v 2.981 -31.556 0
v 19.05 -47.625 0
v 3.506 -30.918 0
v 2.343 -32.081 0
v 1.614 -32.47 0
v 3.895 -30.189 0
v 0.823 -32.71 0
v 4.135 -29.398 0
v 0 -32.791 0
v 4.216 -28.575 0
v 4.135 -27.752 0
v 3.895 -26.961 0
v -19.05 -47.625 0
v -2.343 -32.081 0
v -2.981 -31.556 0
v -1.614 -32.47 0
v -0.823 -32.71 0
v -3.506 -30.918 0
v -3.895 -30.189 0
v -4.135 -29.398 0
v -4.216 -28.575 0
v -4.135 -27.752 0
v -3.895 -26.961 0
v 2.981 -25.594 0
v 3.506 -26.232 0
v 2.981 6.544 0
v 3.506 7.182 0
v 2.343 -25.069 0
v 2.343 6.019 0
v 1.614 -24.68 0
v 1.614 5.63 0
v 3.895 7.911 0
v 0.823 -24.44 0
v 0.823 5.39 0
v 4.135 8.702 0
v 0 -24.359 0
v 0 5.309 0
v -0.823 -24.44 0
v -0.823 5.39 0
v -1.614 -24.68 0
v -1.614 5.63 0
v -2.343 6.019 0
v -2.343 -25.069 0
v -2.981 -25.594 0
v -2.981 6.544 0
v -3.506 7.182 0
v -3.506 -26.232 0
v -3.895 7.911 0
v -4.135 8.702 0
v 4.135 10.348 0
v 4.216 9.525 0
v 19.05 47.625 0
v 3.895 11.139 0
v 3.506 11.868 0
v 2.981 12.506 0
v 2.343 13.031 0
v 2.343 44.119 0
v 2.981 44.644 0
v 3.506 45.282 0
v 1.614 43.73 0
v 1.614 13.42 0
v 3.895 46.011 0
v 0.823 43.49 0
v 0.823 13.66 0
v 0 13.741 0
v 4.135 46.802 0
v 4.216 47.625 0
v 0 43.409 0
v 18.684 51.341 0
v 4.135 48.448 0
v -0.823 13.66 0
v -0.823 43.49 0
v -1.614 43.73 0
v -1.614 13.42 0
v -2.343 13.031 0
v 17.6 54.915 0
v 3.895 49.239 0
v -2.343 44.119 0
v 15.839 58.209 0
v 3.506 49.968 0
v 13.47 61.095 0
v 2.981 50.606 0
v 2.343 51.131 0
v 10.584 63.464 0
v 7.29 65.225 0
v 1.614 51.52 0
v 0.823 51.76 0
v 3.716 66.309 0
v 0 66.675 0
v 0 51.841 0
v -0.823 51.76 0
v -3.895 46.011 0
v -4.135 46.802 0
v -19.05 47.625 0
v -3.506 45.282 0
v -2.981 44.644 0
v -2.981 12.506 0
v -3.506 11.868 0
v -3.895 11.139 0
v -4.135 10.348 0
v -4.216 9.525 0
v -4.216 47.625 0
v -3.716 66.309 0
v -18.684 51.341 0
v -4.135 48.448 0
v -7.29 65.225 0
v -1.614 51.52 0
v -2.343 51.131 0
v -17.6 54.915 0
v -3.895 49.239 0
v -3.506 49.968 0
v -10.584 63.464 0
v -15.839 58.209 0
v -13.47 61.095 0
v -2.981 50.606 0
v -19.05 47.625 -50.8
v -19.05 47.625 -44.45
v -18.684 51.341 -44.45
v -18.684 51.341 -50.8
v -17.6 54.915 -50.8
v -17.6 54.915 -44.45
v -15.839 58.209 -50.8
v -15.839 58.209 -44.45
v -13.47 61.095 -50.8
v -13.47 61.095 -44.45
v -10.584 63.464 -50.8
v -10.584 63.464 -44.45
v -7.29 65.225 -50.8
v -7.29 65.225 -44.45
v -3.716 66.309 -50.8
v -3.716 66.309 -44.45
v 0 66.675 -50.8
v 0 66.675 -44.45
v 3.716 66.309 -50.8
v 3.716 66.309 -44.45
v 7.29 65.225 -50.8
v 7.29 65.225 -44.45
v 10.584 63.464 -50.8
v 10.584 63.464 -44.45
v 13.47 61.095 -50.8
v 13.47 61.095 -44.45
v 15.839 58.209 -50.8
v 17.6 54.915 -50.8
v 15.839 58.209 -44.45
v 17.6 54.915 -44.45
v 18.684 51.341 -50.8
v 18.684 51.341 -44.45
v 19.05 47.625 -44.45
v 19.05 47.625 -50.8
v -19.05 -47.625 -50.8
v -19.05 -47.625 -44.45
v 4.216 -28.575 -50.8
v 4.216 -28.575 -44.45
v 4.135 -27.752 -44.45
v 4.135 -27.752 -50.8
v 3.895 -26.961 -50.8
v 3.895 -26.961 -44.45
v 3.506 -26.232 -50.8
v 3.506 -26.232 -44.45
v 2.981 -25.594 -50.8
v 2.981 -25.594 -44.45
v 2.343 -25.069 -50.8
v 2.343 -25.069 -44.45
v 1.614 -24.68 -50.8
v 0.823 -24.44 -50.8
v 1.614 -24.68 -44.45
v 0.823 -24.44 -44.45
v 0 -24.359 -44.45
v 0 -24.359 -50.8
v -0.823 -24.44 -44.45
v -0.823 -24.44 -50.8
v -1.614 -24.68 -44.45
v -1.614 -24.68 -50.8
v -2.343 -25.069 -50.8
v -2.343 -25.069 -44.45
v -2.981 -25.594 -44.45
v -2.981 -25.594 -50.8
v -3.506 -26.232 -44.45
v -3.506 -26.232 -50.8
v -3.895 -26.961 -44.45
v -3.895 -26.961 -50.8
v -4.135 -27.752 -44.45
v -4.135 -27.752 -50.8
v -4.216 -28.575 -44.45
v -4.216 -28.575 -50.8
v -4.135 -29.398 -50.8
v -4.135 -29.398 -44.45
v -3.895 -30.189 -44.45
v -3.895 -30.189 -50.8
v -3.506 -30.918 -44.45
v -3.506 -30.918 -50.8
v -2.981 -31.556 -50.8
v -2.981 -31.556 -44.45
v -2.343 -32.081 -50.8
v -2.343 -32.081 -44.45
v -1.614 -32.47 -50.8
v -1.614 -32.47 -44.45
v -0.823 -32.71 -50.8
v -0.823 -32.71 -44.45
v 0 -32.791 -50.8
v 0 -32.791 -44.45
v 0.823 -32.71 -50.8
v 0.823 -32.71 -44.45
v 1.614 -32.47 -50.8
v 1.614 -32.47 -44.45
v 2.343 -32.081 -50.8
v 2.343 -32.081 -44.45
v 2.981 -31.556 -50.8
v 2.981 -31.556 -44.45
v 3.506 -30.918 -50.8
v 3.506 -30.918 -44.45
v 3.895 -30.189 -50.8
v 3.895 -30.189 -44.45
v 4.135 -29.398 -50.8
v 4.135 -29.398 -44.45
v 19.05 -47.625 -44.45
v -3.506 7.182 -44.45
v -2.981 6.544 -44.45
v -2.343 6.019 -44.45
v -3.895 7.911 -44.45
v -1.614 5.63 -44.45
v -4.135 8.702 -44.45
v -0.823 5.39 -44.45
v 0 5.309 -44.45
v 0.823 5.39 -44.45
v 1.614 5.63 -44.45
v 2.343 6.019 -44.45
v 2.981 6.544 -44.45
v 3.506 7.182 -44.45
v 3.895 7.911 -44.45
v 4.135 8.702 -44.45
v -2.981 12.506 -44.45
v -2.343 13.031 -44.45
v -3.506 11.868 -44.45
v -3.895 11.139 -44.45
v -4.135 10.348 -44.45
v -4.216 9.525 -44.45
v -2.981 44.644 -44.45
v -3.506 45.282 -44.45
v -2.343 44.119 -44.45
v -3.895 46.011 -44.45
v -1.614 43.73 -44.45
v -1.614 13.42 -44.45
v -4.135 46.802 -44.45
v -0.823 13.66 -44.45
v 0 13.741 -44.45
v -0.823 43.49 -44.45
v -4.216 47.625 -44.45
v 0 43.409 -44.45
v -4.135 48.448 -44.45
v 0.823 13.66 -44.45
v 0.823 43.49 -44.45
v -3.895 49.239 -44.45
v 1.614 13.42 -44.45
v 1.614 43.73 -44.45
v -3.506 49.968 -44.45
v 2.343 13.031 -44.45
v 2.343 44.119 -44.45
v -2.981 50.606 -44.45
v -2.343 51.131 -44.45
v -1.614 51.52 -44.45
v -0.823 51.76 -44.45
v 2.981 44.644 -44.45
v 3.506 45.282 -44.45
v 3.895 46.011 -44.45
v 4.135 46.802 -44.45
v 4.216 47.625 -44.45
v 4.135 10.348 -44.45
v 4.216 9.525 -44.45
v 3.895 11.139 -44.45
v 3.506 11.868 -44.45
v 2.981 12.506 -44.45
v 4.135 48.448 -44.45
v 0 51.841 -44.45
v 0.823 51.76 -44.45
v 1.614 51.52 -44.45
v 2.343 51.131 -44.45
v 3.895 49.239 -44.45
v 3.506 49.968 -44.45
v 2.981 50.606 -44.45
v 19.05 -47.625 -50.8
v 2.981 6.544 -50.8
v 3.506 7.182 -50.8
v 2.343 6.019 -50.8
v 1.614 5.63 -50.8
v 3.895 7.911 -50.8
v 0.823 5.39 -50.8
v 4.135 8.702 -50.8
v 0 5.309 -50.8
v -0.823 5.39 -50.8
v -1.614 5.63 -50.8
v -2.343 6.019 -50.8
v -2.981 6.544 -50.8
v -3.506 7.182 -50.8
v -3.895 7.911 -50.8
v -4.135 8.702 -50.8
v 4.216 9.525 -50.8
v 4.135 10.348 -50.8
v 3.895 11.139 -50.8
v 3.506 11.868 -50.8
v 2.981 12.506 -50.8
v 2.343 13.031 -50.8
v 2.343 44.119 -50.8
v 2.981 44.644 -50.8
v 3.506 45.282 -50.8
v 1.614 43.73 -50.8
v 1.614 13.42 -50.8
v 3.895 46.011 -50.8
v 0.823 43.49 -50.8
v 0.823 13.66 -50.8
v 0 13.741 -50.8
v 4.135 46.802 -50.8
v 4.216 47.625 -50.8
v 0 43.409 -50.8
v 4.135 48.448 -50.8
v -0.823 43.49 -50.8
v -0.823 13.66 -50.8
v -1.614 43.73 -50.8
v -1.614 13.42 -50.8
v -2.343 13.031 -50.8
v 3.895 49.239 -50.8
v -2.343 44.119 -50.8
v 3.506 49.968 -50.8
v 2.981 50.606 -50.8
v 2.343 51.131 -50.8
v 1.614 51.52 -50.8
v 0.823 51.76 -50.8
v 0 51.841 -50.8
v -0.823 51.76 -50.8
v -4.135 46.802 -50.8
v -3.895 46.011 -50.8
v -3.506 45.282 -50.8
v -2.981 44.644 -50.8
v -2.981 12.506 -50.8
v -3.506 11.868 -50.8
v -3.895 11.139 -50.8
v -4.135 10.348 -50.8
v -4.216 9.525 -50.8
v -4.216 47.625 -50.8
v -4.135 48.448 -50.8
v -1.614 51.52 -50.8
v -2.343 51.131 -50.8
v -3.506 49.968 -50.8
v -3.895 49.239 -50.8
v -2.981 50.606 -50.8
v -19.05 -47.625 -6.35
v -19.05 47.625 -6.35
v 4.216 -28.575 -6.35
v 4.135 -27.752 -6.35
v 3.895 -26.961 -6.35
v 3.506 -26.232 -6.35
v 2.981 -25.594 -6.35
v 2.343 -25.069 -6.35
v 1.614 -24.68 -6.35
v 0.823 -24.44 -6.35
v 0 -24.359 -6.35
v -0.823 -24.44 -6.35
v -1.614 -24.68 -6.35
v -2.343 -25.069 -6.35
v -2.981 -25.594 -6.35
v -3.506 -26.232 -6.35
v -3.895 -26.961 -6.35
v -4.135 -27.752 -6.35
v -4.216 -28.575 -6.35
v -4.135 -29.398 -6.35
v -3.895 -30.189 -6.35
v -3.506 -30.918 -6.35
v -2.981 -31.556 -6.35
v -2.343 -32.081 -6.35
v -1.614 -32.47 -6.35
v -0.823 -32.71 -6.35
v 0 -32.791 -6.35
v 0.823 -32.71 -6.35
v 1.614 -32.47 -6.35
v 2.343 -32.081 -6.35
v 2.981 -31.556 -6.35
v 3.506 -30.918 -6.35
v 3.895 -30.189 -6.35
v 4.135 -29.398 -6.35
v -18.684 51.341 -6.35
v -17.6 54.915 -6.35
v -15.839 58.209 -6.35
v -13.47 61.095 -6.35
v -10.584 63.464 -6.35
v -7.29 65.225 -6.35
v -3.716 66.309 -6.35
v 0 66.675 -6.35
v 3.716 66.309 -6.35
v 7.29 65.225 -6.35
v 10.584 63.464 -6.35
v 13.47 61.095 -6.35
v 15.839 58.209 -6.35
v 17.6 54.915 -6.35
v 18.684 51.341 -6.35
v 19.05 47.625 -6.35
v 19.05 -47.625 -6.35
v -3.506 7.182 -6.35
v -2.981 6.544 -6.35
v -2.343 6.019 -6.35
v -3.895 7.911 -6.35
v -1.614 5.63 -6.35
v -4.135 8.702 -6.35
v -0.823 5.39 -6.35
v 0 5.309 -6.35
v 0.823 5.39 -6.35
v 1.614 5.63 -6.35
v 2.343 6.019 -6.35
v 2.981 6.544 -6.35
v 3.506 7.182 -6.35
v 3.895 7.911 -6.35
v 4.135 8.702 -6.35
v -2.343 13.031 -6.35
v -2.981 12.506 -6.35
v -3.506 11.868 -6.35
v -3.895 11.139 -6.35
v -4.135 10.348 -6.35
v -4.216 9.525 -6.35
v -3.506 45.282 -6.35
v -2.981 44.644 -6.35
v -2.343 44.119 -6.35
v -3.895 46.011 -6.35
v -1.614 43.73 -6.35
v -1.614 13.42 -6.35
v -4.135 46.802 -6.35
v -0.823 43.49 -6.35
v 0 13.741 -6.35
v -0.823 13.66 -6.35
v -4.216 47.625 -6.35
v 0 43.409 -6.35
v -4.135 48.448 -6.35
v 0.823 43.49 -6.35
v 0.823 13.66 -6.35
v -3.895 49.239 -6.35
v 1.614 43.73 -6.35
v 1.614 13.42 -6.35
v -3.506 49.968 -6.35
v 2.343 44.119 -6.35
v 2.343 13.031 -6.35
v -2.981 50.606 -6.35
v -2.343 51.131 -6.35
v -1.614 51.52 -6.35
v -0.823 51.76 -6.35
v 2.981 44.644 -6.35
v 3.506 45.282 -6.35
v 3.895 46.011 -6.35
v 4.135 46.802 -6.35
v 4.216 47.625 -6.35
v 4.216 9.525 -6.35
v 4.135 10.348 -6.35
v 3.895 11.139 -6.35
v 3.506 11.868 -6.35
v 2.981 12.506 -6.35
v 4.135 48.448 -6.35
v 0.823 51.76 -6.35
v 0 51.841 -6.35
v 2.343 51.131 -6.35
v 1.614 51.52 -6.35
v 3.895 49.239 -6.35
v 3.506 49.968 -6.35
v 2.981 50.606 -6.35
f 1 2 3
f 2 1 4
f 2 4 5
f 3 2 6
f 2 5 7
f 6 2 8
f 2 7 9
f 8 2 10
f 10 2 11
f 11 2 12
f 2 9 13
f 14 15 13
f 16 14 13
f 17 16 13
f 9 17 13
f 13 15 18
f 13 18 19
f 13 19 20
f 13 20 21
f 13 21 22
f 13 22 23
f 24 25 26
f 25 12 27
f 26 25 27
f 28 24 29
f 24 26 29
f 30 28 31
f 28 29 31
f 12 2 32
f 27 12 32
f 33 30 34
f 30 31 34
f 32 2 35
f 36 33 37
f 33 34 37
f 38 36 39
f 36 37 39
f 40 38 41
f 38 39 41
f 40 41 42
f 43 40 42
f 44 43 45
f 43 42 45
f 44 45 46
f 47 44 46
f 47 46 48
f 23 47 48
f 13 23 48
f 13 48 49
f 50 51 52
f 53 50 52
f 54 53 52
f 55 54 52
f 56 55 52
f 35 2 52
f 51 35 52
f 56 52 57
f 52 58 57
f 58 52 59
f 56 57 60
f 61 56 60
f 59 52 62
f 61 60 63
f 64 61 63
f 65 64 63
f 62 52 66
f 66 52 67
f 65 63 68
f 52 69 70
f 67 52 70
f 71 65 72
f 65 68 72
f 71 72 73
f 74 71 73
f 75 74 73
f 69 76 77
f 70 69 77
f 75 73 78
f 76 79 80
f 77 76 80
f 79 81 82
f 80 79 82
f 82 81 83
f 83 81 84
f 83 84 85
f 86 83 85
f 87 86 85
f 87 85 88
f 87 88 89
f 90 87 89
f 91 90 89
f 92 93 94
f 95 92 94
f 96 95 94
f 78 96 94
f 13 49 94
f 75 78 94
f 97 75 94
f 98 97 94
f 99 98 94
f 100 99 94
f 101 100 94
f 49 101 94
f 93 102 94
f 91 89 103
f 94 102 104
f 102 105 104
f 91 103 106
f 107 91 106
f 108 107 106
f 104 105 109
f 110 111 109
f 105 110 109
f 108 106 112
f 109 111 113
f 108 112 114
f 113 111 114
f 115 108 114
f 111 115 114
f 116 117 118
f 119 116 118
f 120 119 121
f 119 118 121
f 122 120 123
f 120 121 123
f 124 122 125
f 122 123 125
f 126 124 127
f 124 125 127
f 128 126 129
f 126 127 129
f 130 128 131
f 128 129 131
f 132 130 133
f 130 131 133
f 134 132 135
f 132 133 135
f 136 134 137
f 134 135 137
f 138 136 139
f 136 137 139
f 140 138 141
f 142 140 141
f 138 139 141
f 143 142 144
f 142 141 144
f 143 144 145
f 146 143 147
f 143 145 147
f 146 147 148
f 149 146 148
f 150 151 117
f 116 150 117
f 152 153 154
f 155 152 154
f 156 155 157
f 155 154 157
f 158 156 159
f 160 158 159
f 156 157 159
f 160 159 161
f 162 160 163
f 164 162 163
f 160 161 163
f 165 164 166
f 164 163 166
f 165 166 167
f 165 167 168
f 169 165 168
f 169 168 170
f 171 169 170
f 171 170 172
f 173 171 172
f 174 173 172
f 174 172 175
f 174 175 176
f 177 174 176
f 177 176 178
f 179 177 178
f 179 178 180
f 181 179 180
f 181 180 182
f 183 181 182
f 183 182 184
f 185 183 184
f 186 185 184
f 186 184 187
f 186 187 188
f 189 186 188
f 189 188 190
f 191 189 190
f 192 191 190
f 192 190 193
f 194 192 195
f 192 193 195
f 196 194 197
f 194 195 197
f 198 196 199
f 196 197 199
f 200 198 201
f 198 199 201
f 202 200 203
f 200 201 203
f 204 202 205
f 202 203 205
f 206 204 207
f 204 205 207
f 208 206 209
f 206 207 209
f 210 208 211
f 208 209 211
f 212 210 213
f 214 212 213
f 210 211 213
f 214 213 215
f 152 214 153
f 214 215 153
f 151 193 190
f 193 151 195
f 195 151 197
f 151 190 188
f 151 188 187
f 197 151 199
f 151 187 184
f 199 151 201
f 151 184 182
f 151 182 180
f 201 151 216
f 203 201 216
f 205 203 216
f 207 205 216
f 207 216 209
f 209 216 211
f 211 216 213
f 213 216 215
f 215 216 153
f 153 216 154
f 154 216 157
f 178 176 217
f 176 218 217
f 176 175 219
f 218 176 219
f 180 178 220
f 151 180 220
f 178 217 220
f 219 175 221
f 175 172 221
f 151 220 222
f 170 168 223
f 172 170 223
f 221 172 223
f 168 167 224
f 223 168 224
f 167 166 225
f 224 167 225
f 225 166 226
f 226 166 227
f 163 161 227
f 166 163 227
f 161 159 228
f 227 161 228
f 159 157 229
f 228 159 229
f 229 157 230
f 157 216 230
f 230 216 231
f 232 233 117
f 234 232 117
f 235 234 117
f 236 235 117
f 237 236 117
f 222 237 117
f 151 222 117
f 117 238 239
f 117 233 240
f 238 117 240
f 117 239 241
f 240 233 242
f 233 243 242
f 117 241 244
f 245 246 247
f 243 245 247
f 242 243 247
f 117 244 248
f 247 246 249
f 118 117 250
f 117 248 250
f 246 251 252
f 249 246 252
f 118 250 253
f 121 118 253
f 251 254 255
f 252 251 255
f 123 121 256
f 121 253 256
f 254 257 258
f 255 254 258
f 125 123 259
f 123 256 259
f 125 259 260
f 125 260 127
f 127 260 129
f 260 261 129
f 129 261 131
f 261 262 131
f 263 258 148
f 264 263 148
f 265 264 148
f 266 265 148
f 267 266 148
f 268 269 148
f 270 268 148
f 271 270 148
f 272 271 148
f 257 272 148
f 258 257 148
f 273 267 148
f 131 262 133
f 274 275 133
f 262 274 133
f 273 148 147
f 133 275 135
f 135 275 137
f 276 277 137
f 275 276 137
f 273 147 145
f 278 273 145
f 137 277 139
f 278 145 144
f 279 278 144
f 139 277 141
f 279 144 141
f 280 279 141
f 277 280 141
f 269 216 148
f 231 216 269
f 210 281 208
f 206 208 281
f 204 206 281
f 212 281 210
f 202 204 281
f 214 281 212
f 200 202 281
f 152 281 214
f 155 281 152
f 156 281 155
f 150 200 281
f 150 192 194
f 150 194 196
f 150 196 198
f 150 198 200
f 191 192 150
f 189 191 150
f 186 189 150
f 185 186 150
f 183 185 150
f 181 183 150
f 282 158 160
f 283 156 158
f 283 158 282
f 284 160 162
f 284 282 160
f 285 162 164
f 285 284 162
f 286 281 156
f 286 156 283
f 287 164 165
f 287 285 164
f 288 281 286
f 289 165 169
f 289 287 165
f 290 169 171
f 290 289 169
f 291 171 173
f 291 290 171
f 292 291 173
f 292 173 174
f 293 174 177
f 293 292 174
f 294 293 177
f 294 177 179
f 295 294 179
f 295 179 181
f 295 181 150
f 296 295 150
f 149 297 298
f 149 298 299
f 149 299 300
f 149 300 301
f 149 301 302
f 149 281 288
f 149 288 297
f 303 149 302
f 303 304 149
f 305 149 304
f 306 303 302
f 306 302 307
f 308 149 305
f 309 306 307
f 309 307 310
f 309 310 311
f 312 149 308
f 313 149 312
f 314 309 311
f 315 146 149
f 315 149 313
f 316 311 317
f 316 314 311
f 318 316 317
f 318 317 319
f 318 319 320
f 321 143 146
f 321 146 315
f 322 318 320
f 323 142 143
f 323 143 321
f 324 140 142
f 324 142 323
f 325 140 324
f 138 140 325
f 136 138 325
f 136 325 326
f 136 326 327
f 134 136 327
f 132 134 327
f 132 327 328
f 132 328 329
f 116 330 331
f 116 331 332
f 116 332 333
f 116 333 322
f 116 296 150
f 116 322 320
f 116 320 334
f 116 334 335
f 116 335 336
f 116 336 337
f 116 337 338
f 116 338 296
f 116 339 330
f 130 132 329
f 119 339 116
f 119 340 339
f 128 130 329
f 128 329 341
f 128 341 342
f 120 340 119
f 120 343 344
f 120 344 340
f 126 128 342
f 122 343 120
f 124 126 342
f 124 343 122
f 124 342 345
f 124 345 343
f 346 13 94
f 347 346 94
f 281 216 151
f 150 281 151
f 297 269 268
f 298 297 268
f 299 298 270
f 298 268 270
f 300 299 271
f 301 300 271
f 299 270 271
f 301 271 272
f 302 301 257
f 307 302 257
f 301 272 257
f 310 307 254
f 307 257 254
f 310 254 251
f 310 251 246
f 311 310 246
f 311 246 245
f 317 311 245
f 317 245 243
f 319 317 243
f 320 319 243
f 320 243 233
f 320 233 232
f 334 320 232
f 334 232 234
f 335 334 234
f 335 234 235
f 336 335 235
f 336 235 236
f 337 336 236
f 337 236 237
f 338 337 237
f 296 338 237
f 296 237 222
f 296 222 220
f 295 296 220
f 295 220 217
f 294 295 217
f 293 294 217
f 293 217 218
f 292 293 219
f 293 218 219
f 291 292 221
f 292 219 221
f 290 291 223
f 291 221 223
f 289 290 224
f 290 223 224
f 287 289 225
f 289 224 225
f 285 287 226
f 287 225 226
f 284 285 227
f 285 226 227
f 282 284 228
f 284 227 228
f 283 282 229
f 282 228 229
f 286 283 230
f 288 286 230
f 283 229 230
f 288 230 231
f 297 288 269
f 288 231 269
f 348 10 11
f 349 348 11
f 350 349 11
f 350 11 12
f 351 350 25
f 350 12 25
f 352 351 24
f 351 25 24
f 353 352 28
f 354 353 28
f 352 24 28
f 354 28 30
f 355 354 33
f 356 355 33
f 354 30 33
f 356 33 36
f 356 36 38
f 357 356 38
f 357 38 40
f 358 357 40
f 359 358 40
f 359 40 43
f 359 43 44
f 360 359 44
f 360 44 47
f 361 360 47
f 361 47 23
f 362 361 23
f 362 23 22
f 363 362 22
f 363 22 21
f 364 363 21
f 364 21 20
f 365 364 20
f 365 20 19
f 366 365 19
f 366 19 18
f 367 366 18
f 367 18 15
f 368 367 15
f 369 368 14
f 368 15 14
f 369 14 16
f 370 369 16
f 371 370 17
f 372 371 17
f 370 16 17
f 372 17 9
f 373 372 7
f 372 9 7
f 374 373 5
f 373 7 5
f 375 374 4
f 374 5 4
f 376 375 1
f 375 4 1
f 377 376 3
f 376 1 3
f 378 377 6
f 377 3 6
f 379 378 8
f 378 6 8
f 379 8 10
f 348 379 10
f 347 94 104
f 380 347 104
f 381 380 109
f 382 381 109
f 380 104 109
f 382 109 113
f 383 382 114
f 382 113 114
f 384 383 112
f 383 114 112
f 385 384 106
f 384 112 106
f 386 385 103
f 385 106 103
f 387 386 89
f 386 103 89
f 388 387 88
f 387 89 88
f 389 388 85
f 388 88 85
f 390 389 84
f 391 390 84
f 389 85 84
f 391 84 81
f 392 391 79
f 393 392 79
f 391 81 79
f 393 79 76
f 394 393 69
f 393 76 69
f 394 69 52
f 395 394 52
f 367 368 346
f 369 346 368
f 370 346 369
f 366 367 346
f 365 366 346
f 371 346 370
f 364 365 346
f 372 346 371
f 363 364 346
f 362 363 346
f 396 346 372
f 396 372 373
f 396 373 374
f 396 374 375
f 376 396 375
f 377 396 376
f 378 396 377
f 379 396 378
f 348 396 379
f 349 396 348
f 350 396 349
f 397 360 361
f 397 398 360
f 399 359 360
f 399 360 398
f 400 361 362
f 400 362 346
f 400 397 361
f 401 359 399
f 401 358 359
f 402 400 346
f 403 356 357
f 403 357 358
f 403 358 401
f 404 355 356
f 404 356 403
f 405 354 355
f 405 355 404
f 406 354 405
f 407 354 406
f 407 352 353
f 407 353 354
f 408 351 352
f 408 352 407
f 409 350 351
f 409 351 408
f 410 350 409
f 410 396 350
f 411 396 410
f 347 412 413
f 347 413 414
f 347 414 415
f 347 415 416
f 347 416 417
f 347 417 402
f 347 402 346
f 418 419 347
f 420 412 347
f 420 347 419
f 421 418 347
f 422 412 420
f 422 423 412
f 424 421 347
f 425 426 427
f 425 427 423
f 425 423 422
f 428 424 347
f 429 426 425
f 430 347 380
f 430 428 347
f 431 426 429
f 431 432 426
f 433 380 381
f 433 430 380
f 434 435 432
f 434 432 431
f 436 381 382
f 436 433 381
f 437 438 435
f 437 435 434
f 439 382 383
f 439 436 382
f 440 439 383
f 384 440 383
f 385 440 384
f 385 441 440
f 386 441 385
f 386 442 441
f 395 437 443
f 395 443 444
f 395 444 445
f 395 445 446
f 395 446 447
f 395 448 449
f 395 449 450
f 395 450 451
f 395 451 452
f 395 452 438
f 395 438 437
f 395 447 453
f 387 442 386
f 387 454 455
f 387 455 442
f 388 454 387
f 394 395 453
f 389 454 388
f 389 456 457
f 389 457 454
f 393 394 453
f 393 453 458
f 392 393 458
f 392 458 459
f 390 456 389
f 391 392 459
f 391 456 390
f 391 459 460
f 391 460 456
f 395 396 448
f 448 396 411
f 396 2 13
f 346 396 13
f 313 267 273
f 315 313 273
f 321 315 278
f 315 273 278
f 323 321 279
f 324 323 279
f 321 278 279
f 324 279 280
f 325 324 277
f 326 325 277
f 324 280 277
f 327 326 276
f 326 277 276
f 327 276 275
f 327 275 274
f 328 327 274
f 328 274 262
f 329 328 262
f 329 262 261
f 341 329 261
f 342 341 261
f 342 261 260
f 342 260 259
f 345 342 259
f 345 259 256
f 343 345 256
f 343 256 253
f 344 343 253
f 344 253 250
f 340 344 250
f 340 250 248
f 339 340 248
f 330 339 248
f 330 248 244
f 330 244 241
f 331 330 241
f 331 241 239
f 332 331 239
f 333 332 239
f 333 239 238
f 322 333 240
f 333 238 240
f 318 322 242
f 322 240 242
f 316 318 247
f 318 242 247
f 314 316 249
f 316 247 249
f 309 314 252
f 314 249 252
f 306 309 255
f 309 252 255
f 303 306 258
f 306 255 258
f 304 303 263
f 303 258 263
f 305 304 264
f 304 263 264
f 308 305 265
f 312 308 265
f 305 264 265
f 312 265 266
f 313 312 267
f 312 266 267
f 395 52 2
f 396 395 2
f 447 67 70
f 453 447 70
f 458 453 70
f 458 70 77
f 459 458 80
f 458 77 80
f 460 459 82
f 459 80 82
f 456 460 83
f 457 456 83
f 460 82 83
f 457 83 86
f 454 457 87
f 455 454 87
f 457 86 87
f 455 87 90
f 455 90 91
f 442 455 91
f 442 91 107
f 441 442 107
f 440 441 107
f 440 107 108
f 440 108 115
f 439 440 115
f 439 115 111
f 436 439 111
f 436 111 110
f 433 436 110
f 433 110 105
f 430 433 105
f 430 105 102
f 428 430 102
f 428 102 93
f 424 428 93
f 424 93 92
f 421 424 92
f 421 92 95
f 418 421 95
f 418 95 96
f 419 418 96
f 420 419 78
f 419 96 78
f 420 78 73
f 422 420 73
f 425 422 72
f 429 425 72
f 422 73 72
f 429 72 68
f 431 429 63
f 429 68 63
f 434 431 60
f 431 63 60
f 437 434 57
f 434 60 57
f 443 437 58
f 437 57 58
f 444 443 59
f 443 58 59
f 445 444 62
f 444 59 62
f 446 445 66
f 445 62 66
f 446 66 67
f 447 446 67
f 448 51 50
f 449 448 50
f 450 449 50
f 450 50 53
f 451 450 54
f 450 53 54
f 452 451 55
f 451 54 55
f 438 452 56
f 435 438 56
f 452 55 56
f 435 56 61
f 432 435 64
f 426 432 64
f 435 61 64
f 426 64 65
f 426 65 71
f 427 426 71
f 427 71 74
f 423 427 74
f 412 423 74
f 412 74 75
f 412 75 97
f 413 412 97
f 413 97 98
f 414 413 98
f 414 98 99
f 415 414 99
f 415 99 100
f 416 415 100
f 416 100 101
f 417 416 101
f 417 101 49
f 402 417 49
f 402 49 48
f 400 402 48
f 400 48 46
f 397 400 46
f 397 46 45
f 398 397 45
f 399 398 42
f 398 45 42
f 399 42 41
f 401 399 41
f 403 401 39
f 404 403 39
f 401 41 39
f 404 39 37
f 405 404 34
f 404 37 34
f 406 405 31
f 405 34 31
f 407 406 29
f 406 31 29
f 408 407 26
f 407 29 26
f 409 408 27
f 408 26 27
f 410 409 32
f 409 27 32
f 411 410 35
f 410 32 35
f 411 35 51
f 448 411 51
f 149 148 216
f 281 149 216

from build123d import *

# Parameters (mm, degrees)
SKETCH1_R           = 4.2164
BOSS_EXTRUDE1_DEPTH = 50.8
SKETCH2_W           = 38.1
SKETCH2_H           = 114.3
CUT_EXTRUDE1_DEPTH  = 50.8


with BuildPart() as part:
    # Sketch1 → Boss-Extrude1 (new body)
    with BuildSketch(Plane.XY):
        with BuildLine():
            Line((19.05, 47.625), (19.05, -47.625))
            Line((19.05, -47.625), (-19.05, -47.625))
            Line((-19.05, -47.625), (-19.05, 47.625))
            ThreePointArc((-19.05, 47.625), (0, 66.675), (19.05, 47.625))
        make_face()
        with Locations((0, 47.625)):
            Circle(SKETCH1_R, mode=Mode.SUBTRACT)
        with Locations((0, 9.525)):
            Circle(SKETCH1_R, mode=Mode.SUBTRACT)
        with Locations((0, -28.575)):
            Circle(SKETCH1_R, mode=Mode.SUBTRACT)
    extrude(amount=-BOSS_EXTRUDE1_DEPTH)

    # Sketch2 → Cut-Extrude1 (cut)
    with BuildSketch(Plane(origin=(19.05, 0, 0), x_dir=(0, 0, -1), z_dir=(1, 0, 0))):
        with Locations((25.4, 9.525)):
            Rectangle(SKETCH2_W, SKETCH2_H)
    extrude(amount=-CUT_EXTRUDE1_DEPTH, mode=Mode.SUBTRACT)


with BuildPart() as cut_extrude1_piece_1:
    # of the separate pieces the step leaves, piece 1, a body of its own (cut_extrude1_pieces)
    add(part.part.solids().sort_by_distance((19.05, 47.625, 0))[0])


with BuildPart() as cut_extrude1_piece_2:
    # of the separate pieces the step leaves, piece 2, a body of its own (cut_extrude1_pieces)
    add(part.part.solids().sort_by_distance((19.05, 47.625, -44.45))[0])


solid = Compound([cut_extrude1_piece_1.part, cut_extrude1_piece_2.part])
